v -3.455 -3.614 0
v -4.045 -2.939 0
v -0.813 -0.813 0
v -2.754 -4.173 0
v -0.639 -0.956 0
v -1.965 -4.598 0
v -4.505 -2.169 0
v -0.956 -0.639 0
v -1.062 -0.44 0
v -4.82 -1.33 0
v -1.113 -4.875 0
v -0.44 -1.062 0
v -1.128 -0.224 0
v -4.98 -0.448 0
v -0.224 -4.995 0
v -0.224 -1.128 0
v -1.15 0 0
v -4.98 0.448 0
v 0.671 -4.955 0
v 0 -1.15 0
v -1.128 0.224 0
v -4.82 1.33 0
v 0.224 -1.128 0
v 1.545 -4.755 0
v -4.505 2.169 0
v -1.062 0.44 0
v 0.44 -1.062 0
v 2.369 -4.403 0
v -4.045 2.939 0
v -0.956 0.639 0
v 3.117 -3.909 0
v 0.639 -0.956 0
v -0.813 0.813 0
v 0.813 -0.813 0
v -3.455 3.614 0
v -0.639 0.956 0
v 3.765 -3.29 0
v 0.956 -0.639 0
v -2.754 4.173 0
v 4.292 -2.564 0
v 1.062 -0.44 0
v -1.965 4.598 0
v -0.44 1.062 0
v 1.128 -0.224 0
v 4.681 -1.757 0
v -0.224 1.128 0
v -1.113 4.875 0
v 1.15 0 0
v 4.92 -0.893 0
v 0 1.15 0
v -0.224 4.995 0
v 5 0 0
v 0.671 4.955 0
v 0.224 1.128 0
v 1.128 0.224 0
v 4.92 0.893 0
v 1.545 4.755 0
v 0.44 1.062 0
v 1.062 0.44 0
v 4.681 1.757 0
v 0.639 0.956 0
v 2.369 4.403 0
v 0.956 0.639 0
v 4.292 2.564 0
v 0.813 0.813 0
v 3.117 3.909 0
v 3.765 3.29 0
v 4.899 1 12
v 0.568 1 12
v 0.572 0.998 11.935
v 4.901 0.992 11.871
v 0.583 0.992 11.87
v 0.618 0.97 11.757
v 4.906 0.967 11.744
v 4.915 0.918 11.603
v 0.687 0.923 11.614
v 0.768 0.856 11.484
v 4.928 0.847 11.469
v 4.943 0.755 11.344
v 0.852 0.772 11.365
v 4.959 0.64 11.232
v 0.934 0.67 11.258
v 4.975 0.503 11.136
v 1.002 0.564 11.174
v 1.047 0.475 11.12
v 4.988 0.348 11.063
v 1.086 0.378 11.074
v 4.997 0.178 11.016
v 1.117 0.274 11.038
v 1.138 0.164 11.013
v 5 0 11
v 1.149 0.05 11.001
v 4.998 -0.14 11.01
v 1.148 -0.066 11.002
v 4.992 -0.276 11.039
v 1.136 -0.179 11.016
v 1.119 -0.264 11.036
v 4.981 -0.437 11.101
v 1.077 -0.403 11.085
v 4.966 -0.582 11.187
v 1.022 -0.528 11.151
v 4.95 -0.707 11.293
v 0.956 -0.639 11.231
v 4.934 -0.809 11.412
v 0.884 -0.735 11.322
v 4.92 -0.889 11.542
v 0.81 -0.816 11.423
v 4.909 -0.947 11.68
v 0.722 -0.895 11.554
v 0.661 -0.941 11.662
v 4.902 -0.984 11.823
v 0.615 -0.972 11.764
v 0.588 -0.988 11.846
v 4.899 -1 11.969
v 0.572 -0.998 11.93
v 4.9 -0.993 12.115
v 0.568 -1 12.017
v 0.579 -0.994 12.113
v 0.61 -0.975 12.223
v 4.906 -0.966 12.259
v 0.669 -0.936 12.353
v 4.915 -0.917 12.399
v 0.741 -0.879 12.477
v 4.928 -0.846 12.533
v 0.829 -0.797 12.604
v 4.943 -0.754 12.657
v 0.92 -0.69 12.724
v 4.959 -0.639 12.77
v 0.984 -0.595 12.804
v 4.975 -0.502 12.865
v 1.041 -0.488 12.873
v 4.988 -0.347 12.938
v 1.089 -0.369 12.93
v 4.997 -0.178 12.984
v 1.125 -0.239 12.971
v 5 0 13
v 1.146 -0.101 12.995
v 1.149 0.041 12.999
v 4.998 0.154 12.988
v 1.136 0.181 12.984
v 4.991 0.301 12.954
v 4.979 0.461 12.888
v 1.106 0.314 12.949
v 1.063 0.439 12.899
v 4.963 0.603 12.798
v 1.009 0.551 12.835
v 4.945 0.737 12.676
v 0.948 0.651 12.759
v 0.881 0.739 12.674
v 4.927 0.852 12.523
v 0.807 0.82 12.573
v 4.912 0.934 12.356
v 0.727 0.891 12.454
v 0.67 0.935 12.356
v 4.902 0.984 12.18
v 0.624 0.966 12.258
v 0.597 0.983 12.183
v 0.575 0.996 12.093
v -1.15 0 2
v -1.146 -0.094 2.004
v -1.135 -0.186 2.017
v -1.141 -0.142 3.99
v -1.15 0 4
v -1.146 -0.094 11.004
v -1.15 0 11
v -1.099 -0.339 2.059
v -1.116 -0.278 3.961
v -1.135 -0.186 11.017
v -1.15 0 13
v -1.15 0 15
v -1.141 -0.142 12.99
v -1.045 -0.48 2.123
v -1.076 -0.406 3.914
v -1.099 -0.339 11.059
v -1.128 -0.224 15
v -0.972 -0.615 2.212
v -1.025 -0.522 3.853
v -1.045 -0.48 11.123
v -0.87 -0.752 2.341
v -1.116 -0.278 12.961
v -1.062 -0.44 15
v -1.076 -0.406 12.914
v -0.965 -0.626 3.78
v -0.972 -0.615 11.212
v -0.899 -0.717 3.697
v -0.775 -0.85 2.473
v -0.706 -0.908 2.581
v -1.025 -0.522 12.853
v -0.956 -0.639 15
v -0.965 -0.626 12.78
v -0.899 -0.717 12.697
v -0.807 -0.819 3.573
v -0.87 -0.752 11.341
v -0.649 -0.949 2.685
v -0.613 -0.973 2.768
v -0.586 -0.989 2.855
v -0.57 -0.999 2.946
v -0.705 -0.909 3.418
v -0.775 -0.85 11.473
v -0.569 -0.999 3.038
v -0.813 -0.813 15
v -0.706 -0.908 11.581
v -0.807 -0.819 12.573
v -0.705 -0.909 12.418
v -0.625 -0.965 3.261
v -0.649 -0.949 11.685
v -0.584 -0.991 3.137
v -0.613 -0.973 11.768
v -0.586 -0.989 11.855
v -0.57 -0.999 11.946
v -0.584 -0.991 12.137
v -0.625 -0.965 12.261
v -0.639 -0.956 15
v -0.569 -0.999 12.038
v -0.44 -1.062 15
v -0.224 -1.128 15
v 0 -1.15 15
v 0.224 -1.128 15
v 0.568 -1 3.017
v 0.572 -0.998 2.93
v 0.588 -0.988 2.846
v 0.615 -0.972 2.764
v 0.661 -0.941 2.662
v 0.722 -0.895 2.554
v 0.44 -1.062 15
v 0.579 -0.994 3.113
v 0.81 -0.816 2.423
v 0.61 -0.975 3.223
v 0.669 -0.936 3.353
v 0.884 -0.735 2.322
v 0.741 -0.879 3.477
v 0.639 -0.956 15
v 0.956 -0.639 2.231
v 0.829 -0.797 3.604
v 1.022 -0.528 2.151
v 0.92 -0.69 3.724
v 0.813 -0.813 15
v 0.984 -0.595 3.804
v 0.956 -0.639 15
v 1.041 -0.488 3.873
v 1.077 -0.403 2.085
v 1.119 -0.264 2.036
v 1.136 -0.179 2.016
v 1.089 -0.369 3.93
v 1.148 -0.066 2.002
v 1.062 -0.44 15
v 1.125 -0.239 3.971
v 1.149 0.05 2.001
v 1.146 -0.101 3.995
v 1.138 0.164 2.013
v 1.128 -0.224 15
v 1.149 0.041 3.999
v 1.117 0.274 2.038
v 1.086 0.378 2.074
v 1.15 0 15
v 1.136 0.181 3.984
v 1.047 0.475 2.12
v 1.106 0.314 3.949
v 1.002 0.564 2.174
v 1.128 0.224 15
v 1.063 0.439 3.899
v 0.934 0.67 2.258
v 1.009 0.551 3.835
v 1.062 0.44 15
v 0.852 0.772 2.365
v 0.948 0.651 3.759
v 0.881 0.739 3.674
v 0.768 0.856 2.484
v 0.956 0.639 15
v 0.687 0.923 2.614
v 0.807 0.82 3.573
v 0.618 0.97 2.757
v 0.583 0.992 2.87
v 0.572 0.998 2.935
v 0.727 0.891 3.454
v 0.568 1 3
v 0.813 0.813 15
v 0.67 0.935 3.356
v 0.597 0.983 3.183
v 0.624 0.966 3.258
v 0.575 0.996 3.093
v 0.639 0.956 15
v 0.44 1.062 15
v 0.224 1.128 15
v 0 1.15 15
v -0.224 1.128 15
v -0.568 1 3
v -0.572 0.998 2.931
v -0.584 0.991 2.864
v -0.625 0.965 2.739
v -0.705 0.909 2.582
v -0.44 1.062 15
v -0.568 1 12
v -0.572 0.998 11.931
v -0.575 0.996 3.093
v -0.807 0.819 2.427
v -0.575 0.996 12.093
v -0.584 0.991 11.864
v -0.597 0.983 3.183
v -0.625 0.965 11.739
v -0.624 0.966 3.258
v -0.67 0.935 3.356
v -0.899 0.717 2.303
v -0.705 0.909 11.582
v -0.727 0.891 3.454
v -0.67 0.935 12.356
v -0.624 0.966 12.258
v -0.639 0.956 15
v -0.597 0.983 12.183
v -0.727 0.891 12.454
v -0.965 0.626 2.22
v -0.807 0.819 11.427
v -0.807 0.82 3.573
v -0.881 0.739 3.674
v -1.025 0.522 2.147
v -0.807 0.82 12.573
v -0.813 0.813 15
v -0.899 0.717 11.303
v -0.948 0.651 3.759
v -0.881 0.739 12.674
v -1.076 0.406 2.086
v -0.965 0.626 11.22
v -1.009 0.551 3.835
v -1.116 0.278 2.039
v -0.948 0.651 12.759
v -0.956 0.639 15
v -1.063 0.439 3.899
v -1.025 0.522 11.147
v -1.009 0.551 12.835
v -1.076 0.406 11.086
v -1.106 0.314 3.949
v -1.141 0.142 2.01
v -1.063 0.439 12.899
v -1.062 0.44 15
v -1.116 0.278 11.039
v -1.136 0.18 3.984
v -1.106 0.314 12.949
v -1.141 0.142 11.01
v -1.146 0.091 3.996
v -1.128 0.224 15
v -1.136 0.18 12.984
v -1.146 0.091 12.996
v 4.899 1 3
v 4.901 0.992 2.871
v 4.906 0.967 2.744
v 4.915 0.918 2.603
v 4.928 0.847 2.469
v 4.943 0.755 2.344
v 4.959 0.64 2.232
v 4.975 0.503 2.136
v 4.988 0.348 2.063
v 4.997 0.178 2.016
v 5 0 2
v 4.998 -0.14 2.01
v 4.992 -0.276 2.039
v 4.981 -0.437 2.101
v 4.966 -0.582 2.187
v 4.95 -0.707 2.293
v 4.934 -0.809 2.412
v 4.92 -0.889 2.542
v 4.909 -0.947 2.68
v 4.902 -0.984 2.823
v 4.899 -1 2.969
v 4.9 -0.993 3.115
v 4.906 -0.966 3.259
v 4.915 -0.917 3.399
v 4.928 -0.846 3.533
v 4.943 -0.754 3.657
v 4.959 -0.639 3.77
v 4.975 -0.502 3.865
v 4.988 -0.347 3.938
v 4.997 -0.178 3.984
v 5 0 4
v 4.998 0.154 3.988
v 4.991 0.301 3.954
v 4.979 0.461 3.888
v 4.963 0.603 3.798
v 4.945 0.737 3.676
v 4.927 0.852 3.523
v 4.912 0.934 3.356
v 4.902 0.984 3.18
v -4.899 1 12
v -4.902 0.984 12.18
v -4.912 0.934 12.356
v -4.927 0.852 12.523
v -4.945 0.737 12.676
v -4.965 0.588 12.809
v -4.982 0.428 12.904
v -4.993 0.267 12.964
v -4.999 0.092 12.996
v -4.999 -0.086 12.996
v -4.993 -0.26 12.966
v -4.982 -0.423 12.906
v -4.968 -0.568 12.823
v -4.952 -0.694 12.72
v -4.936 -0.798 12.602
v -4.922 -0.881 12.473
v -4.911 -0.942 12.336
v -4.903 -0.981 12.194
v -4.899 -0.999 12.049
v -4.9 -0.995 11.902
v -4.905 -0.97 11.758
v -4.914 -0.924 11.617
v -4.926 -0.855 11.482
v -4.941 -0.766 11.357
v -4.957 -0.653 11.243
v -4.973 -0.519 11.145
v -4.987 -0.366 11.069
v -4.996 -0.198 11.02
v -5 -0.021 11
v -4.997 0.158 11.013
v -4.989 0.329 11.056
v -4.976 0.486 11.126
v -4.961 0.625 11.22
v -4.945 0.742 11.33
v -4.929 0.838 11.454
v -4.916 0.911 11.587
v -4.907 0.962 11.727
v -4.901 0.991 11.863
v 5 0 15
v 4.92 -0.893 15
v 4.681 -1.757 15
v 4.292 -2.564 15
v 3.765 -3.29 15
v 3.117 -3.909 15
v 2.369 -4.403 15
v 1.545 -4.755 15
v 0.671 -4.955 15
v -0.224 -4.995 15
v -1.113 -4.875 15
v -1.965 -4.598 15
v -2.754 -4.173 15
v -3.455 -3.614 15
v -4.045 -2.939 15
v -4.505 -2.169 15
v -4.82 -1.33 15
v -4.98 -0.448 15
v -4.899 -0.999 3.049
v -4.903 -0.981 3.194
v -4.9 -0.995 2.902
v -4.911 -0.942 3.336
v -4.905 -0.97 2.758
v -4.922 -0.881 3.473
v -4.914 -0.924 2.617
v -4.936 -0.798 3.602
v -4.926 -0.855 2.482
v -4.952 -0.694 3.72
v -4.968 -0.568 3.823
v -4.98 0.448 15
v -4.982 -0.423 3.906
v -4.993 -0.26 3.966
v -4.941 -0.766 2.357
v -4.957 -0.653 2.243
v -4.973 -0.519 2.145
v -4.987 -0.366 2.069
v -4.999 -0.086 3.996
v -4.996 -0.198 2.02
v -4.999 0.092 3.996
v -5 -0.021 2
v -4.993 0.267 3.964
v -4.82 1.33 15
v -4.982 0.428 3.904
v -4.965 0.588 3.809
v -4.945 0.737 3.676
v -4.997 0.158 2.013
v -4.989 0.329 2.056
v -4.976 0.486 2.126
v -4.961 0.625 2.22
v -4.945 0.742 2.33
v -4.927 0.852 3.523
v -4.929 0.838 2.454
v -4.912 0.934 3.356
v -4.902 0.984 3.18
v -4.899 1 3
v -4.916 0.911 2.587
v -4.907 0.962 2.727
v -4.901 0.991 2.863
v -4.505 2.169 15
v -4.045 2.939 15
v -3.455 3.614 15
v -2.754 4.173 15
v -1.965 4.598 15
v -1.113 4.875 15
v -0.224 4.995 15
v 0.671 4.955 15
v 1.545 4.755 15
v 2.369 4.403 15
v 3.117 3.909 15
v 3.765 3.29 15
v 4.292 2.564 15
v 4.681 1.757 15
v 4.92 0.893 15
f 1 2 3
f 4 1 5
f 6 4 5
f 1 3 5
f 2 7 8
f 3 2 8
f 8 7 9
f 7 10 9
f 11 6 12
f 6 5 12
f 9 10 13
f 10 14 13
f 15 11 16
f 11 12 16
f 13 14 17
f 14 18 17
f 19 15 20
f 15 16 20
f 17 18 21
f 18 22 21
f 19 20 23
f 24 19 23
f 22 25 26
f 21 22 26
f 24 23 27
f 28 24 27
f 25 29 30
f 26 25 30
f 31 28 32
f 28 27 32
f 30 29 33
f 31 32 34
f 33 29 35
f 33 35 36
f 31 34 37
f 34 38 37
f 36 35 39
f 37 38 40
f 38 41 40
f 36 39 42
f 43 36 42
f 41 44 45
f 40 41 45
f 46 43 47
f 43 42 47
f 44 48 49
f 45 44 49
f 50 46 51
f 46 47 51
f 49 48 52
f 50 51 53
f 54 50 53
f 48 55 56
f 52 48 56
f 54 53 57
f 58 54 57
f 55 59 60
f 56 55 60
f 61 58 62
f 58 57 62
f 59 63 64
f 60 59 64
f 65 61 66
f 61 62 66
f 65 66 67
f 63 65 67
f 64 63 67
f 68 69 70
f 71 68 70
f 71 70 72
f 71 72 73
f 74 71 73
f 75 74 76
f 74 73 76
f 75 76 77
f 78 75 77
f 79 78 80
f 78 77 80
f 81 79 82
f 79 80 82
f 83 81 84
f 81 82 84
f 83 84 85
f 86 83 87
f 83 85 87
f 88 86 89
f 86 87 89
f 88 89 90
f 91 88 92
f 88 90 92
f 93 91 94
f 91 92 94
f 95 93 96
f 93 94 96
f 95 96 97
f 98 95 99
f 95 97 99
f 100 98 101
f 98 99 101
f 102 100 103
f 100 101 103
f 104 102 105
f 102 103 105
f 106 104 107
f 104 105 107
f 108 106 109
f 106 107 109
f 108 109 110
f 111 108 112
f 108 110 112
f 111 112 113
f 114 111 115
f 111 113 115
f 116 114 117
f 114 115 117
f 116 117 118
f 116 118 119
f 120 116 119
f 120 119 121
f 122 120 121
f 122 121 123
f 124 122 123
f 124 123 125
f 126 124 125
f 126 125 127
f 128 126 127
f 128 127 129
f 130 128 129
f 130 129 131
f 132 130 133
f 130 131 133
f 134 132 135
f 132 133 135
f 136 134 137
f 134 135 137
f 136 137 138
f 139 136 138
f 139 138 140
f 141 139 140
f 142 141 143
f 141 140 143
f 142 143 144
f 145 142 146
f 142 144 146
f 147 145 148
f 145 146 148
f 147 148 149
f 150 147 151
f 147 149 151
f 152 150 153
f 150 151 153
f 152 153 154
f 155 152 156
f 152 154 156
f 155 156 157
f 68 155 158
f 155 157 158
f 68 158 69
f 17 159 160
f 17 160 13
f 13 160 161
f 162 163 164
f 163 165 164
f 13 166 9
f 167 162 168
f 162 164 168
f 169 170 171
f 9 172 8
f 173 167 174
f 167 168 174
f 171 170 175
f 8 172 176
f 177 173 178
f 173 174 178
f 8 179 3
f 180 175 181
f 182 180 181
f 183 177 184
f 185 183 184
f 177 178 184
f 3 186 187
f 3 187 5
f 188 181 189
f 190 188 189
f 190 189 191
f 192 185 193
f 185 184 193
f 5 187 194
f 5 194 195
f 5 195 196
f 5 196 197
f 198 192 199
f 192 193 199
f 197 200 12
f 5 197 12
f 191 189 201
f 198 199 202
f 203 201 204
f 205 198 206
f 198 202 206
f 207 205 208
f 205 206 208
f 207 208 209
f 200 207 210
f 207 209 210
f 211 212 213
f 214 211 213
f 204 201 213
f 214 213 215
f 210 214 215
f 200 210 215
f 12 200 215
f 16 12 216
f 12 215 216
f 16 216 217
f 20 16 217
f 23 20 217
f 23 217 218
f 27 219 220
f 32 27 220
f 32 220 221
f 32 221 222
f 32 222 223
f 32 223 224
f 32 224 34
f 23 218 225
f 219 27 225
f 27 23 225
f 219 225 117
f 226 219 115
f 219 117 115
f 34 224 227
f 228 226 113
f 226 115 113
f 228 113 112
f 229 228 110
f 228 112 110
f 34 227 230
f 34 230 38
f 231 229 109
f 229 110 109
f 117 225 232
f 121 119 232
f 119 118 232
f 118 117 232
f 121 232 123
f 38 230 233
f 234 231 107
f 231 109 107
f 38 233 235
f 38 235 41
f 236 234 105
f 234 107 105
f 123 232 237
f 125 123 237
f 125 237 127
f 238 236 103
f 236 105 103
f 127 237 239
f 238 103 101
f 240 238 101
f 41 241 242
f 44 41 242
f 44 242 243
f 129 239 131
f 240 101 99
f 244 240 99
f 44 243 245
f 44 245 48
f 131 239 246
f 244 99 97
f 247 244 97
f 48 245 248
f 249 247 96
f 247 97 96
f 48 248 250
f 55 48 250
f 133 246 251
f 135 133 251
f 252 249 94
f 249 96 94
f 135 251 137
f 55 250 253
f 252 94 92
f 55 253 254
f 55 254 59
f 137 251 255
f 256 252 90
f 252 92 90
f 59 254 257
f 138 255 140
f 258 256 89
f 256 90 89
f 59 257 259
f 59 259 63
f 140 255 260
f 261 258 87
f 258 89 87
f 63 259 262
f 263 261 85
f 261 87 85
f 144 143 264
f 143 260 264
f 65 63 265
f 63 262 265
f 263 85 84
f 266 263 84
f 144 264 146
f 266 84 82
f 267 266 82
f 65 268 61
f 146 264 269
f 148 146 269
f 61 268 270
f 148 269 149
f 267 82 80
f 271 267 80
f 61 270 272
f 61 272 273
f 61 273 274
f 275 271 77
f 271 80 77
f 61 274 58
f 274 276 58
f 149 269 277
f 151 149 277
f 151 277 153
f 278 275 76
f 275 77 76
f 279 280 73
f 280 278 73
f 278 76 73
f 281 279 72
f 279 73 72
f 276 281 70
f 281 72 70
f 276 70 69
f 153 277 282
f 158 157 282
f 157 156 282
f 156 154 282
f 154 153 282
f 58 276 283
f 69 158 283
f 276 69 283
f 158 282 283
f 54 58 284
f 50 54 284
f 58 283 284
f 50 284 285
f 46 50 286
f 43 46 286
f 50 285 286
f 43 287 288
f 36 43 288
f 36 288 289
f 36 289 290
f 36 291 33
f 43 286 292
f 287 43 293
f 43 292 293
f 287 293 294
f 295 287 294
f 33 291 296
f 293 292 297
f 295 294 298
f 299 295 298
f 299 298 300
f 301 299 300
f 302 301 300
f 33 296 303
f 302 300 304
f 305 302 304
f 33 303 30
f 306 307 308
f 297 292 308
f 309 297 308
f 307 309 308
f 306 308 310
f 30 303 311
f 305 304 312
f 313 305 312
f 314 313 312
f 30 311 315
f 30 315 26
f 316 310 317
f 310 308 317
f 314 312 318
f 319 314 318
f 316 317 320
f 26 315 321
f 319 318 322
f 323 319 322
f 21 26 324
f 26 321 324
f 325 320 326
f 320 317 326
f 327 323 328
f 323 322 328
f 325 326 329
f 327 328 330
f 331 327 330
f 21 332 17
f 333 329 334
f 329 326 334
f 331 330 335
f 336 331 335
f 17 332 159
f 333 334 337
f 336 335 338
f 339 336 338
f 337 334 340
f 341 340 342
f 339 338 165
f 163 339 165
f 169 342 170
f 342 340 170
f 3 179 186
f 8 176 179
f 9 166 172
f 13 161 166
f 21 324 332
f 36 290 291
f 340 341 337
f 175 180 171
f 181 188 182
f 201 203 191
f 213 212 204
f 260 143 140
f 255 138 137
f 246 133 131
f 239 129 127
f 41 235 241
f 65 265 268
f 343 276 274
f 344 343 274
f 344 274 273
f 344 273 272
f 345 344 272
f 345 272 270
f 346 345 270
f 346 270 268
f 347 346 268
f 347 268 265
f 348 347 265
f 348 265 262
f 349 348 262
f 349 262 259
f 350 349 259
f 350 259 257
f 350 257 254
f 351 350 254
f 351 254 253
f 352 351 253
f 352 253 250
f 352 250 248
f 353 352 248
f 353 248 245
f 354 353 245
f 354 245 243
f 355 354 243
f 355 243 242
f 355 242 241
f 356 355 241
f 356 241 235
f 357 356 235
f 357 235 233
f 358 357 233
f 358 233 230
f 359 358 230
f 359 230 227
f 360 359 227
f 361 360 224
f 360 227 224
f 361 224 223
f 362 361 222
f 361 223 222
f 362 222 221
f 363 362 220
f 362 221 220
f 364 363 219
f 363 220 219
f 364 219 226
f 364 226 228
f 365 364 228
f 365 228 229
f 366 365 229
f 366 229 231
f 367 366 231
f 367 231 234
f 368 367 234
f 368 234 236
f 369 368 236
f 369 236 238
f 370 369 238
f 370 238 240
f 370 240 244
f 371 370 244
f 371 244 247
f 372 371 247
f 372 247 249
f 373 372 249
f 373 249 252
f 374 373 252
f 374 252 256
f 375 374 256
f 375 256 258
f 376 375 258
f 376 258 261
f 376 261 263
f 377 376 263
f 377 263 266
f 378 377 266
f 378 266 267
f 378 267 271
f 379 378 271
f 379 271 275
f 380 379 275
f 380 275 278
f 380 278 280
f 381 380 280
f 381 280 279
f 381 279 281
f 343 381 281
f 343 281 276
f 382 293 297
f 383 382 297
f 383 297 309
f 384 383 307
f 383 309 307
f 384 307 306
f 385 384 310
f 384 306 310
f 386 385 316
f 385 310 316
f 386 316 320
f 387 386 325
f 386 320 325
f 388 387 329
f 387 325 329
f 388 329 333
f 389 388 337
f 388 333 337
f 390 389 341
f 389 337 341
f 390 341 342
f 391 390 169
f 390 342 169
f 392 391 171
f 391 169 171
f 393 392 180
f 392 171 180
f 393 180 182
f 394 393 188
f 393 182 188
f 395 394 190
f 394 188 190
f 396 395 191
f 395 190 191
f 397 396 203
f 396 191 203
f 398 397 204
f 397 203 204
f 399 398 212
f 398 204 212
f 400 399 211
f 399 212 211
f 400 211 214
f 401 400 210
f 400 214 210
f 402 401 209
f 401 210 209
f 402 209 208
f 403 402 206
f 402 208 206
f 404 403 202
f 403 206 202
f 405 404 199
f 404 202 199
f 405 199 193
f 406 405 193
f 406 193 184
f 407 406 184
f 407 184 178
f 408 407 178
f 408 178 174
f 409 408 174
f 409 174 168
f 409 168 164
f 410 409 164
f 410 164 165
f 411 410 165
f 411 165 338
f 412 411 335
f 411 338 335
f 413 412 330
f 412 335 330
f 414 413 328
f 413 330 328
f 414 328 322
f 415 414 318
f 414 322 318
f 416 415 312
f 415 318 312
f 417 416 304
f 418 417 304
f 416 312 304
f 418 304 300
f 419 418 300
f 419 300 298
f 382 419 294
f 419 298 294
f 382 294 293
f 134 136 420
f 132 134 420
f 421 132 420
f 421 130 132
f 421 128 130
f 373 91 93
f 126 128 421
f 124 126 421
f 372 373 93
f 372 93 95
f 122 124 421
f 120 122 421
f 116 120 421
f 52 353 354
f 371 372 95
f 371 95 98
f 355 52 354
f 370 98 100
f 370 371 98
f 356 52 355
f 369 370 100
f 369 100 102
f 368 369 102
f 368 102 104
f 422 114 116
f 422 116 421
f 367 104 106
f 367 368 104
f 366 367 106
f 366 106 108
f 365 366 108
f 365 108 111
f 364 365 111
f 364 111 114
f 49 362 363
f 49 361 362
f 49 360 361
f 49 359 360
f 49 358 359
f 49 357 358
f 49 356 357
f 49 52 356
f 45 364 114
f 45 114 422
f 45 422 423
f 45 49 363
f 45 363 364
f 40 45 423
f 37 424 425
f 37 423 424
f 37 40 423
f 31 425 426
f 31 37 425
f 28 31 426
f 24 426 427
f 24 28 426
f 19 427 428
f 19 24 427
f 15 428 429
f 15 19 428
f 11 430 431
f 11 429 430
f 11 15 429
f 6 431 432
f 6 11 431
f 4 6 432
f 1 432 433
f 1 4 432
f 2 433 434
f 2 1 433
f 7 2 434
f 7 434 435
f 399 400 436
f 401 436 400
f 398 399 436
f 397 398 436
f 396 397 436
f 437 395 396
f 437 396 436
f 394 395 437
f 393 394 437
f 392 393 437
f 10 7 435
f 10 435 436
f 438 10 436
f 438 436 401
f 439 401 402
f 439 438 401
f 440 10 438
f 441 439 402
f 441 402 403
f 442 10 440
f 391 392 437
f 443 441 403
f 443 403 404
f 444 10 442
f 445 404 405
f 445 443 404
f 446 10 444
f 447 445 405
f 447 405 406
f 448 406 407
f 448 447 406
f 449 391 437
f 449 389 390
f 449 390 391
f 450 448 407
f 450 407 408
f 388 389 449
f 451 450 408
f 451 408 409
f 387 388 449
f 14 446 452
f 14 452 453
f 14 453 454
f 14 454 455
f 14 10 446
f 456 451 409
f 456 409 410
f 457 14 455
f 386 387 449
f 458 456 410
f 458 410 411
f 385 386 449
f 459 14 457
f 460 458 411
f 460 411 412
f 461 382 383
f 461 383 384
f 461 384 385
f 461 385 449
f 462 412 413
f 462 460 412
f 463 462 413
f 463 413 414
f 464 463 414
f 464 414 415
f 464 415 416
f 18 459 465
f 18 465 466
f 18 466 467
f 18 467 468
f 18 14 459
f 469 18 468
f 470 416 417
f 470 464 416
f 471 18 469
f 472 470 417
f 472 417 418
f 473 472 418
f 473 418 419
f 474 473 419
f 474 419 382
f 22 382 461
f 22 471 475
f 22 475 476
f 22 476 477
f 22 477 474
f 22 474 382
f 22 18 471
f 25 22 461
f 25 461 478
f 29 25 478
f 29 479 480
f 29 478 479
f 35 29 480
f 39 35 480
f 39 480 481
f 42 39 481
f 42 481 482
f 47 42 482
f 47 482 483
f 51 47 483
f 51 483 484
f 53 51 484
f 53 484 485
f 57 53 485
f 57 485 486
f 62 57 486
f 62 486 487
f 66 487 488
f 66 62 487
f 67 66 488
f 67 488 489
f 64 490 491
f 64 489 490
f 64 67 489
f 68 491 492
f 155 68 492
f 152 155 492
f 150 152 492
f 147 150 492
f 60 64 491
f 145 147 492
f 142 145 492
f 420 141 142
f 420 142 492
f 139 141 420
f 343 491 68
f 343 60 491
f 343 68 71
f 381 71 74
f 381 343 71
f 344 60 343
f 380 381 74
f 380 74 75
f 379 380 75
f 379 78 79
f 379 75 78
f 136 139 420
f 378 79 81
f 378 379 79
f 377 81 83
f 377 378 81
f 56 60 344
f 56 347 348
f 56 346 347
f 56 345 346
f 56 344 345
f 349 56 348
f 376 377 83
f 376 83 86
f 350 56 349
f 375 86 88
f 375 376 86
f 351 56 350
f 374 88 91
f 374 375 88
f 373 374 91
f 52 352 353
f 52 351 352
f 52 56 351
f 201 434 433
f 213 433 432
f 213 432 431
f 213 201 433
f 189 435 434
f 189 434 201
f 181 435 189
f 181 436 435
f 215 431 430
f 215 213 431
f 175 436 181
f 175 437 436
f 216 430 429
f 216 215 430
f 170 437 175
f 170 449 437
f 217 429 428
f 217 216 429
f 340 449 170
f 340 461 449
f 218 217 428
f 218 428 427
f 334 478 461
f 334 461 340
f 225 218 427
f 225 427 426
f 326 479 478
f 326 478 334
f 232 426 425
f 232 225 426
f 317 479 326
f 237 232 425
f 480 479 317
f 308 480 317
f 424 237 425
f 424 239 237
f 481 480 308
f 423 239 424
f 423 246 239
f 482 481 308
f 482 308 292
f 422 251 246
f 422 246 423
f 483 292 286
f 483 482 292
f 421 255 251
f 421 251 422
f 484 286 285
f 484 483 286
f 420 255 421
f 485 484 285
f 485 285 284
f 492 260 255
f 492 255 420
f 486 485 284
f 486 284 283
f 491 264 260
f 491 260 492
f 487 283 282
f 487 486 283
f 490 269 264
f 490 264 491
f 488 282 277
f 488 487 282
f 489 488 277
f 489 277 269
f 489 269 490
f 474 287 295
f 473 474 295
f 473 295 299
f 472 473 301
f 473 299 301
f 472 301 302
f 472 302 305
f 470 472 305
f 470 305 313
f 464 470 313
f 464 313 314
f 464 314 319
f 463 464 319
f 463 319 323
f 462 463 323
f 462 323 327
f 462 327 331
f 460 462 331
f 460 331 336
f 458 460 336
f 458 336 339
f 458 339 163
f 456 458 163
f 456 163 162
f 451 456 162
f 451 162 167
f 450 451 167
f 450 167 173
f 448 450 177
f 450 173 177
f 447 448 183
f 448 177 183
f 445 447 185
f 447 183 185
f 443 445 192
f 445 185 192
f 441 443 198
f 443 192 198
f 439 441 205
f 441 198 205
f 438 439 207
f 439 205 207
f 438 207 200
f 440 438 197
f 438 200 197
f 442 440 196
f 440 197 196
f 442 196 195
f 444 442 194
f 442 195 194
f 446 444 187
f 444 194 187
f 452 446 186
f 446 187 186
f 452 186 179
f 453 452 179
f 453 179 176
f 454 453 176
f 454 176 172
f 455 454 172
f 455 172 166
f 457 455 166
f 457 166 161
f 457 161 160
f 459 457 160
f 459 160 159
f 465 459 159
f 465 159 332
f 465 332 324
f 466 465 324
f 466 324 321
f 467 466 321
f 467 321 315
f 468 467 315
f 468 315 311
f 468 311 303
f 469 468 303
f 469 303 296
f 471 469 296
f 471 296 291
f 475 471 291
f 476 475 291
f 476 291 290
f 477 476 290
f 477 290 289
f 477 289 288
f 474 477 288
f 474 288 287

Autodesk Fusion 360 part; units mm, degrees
sketch "Sketch1" plane through (0, 0, 0) normal (0, 0, 1) x (1, 0, 0)
  circle A0 centre (0, 0) radius 5
  dimension "d1" = 10
extrude "Extrude1" add sketch "Sketch1" along normal blind 15
sketch "Sketch3" plane through (0, 0, 0) normal (1, 0, 0) x (0, 1, 0)
  line L0 (0, 15) -> (0, 12) construction
  line L1 (0, 0) -> (0, 3) construction
  circle A0 centre (0, 12) radius 1
  circle A1 centre (0, 3) radius 1
  dimension "d5" = 2
  dimension "d6" = 2
  dimension "d9" = 3
  dimension "d10" = 3
extrude "Extrude2" cut sketch "Sketch3" along normal mid plane 12
sketch "Sketch4" plane through (0, 0, 15) normal (0, 0, 1) x (-1, 0, 0)
  circle A0 centre (0, 0) radius 5
  circle A1 centre (0, 0) radius 1.15
  dimension "d11" = 2.3
extrude "Extrude3" cut sketch "Sketch4" against normal blind 15 contours A1
